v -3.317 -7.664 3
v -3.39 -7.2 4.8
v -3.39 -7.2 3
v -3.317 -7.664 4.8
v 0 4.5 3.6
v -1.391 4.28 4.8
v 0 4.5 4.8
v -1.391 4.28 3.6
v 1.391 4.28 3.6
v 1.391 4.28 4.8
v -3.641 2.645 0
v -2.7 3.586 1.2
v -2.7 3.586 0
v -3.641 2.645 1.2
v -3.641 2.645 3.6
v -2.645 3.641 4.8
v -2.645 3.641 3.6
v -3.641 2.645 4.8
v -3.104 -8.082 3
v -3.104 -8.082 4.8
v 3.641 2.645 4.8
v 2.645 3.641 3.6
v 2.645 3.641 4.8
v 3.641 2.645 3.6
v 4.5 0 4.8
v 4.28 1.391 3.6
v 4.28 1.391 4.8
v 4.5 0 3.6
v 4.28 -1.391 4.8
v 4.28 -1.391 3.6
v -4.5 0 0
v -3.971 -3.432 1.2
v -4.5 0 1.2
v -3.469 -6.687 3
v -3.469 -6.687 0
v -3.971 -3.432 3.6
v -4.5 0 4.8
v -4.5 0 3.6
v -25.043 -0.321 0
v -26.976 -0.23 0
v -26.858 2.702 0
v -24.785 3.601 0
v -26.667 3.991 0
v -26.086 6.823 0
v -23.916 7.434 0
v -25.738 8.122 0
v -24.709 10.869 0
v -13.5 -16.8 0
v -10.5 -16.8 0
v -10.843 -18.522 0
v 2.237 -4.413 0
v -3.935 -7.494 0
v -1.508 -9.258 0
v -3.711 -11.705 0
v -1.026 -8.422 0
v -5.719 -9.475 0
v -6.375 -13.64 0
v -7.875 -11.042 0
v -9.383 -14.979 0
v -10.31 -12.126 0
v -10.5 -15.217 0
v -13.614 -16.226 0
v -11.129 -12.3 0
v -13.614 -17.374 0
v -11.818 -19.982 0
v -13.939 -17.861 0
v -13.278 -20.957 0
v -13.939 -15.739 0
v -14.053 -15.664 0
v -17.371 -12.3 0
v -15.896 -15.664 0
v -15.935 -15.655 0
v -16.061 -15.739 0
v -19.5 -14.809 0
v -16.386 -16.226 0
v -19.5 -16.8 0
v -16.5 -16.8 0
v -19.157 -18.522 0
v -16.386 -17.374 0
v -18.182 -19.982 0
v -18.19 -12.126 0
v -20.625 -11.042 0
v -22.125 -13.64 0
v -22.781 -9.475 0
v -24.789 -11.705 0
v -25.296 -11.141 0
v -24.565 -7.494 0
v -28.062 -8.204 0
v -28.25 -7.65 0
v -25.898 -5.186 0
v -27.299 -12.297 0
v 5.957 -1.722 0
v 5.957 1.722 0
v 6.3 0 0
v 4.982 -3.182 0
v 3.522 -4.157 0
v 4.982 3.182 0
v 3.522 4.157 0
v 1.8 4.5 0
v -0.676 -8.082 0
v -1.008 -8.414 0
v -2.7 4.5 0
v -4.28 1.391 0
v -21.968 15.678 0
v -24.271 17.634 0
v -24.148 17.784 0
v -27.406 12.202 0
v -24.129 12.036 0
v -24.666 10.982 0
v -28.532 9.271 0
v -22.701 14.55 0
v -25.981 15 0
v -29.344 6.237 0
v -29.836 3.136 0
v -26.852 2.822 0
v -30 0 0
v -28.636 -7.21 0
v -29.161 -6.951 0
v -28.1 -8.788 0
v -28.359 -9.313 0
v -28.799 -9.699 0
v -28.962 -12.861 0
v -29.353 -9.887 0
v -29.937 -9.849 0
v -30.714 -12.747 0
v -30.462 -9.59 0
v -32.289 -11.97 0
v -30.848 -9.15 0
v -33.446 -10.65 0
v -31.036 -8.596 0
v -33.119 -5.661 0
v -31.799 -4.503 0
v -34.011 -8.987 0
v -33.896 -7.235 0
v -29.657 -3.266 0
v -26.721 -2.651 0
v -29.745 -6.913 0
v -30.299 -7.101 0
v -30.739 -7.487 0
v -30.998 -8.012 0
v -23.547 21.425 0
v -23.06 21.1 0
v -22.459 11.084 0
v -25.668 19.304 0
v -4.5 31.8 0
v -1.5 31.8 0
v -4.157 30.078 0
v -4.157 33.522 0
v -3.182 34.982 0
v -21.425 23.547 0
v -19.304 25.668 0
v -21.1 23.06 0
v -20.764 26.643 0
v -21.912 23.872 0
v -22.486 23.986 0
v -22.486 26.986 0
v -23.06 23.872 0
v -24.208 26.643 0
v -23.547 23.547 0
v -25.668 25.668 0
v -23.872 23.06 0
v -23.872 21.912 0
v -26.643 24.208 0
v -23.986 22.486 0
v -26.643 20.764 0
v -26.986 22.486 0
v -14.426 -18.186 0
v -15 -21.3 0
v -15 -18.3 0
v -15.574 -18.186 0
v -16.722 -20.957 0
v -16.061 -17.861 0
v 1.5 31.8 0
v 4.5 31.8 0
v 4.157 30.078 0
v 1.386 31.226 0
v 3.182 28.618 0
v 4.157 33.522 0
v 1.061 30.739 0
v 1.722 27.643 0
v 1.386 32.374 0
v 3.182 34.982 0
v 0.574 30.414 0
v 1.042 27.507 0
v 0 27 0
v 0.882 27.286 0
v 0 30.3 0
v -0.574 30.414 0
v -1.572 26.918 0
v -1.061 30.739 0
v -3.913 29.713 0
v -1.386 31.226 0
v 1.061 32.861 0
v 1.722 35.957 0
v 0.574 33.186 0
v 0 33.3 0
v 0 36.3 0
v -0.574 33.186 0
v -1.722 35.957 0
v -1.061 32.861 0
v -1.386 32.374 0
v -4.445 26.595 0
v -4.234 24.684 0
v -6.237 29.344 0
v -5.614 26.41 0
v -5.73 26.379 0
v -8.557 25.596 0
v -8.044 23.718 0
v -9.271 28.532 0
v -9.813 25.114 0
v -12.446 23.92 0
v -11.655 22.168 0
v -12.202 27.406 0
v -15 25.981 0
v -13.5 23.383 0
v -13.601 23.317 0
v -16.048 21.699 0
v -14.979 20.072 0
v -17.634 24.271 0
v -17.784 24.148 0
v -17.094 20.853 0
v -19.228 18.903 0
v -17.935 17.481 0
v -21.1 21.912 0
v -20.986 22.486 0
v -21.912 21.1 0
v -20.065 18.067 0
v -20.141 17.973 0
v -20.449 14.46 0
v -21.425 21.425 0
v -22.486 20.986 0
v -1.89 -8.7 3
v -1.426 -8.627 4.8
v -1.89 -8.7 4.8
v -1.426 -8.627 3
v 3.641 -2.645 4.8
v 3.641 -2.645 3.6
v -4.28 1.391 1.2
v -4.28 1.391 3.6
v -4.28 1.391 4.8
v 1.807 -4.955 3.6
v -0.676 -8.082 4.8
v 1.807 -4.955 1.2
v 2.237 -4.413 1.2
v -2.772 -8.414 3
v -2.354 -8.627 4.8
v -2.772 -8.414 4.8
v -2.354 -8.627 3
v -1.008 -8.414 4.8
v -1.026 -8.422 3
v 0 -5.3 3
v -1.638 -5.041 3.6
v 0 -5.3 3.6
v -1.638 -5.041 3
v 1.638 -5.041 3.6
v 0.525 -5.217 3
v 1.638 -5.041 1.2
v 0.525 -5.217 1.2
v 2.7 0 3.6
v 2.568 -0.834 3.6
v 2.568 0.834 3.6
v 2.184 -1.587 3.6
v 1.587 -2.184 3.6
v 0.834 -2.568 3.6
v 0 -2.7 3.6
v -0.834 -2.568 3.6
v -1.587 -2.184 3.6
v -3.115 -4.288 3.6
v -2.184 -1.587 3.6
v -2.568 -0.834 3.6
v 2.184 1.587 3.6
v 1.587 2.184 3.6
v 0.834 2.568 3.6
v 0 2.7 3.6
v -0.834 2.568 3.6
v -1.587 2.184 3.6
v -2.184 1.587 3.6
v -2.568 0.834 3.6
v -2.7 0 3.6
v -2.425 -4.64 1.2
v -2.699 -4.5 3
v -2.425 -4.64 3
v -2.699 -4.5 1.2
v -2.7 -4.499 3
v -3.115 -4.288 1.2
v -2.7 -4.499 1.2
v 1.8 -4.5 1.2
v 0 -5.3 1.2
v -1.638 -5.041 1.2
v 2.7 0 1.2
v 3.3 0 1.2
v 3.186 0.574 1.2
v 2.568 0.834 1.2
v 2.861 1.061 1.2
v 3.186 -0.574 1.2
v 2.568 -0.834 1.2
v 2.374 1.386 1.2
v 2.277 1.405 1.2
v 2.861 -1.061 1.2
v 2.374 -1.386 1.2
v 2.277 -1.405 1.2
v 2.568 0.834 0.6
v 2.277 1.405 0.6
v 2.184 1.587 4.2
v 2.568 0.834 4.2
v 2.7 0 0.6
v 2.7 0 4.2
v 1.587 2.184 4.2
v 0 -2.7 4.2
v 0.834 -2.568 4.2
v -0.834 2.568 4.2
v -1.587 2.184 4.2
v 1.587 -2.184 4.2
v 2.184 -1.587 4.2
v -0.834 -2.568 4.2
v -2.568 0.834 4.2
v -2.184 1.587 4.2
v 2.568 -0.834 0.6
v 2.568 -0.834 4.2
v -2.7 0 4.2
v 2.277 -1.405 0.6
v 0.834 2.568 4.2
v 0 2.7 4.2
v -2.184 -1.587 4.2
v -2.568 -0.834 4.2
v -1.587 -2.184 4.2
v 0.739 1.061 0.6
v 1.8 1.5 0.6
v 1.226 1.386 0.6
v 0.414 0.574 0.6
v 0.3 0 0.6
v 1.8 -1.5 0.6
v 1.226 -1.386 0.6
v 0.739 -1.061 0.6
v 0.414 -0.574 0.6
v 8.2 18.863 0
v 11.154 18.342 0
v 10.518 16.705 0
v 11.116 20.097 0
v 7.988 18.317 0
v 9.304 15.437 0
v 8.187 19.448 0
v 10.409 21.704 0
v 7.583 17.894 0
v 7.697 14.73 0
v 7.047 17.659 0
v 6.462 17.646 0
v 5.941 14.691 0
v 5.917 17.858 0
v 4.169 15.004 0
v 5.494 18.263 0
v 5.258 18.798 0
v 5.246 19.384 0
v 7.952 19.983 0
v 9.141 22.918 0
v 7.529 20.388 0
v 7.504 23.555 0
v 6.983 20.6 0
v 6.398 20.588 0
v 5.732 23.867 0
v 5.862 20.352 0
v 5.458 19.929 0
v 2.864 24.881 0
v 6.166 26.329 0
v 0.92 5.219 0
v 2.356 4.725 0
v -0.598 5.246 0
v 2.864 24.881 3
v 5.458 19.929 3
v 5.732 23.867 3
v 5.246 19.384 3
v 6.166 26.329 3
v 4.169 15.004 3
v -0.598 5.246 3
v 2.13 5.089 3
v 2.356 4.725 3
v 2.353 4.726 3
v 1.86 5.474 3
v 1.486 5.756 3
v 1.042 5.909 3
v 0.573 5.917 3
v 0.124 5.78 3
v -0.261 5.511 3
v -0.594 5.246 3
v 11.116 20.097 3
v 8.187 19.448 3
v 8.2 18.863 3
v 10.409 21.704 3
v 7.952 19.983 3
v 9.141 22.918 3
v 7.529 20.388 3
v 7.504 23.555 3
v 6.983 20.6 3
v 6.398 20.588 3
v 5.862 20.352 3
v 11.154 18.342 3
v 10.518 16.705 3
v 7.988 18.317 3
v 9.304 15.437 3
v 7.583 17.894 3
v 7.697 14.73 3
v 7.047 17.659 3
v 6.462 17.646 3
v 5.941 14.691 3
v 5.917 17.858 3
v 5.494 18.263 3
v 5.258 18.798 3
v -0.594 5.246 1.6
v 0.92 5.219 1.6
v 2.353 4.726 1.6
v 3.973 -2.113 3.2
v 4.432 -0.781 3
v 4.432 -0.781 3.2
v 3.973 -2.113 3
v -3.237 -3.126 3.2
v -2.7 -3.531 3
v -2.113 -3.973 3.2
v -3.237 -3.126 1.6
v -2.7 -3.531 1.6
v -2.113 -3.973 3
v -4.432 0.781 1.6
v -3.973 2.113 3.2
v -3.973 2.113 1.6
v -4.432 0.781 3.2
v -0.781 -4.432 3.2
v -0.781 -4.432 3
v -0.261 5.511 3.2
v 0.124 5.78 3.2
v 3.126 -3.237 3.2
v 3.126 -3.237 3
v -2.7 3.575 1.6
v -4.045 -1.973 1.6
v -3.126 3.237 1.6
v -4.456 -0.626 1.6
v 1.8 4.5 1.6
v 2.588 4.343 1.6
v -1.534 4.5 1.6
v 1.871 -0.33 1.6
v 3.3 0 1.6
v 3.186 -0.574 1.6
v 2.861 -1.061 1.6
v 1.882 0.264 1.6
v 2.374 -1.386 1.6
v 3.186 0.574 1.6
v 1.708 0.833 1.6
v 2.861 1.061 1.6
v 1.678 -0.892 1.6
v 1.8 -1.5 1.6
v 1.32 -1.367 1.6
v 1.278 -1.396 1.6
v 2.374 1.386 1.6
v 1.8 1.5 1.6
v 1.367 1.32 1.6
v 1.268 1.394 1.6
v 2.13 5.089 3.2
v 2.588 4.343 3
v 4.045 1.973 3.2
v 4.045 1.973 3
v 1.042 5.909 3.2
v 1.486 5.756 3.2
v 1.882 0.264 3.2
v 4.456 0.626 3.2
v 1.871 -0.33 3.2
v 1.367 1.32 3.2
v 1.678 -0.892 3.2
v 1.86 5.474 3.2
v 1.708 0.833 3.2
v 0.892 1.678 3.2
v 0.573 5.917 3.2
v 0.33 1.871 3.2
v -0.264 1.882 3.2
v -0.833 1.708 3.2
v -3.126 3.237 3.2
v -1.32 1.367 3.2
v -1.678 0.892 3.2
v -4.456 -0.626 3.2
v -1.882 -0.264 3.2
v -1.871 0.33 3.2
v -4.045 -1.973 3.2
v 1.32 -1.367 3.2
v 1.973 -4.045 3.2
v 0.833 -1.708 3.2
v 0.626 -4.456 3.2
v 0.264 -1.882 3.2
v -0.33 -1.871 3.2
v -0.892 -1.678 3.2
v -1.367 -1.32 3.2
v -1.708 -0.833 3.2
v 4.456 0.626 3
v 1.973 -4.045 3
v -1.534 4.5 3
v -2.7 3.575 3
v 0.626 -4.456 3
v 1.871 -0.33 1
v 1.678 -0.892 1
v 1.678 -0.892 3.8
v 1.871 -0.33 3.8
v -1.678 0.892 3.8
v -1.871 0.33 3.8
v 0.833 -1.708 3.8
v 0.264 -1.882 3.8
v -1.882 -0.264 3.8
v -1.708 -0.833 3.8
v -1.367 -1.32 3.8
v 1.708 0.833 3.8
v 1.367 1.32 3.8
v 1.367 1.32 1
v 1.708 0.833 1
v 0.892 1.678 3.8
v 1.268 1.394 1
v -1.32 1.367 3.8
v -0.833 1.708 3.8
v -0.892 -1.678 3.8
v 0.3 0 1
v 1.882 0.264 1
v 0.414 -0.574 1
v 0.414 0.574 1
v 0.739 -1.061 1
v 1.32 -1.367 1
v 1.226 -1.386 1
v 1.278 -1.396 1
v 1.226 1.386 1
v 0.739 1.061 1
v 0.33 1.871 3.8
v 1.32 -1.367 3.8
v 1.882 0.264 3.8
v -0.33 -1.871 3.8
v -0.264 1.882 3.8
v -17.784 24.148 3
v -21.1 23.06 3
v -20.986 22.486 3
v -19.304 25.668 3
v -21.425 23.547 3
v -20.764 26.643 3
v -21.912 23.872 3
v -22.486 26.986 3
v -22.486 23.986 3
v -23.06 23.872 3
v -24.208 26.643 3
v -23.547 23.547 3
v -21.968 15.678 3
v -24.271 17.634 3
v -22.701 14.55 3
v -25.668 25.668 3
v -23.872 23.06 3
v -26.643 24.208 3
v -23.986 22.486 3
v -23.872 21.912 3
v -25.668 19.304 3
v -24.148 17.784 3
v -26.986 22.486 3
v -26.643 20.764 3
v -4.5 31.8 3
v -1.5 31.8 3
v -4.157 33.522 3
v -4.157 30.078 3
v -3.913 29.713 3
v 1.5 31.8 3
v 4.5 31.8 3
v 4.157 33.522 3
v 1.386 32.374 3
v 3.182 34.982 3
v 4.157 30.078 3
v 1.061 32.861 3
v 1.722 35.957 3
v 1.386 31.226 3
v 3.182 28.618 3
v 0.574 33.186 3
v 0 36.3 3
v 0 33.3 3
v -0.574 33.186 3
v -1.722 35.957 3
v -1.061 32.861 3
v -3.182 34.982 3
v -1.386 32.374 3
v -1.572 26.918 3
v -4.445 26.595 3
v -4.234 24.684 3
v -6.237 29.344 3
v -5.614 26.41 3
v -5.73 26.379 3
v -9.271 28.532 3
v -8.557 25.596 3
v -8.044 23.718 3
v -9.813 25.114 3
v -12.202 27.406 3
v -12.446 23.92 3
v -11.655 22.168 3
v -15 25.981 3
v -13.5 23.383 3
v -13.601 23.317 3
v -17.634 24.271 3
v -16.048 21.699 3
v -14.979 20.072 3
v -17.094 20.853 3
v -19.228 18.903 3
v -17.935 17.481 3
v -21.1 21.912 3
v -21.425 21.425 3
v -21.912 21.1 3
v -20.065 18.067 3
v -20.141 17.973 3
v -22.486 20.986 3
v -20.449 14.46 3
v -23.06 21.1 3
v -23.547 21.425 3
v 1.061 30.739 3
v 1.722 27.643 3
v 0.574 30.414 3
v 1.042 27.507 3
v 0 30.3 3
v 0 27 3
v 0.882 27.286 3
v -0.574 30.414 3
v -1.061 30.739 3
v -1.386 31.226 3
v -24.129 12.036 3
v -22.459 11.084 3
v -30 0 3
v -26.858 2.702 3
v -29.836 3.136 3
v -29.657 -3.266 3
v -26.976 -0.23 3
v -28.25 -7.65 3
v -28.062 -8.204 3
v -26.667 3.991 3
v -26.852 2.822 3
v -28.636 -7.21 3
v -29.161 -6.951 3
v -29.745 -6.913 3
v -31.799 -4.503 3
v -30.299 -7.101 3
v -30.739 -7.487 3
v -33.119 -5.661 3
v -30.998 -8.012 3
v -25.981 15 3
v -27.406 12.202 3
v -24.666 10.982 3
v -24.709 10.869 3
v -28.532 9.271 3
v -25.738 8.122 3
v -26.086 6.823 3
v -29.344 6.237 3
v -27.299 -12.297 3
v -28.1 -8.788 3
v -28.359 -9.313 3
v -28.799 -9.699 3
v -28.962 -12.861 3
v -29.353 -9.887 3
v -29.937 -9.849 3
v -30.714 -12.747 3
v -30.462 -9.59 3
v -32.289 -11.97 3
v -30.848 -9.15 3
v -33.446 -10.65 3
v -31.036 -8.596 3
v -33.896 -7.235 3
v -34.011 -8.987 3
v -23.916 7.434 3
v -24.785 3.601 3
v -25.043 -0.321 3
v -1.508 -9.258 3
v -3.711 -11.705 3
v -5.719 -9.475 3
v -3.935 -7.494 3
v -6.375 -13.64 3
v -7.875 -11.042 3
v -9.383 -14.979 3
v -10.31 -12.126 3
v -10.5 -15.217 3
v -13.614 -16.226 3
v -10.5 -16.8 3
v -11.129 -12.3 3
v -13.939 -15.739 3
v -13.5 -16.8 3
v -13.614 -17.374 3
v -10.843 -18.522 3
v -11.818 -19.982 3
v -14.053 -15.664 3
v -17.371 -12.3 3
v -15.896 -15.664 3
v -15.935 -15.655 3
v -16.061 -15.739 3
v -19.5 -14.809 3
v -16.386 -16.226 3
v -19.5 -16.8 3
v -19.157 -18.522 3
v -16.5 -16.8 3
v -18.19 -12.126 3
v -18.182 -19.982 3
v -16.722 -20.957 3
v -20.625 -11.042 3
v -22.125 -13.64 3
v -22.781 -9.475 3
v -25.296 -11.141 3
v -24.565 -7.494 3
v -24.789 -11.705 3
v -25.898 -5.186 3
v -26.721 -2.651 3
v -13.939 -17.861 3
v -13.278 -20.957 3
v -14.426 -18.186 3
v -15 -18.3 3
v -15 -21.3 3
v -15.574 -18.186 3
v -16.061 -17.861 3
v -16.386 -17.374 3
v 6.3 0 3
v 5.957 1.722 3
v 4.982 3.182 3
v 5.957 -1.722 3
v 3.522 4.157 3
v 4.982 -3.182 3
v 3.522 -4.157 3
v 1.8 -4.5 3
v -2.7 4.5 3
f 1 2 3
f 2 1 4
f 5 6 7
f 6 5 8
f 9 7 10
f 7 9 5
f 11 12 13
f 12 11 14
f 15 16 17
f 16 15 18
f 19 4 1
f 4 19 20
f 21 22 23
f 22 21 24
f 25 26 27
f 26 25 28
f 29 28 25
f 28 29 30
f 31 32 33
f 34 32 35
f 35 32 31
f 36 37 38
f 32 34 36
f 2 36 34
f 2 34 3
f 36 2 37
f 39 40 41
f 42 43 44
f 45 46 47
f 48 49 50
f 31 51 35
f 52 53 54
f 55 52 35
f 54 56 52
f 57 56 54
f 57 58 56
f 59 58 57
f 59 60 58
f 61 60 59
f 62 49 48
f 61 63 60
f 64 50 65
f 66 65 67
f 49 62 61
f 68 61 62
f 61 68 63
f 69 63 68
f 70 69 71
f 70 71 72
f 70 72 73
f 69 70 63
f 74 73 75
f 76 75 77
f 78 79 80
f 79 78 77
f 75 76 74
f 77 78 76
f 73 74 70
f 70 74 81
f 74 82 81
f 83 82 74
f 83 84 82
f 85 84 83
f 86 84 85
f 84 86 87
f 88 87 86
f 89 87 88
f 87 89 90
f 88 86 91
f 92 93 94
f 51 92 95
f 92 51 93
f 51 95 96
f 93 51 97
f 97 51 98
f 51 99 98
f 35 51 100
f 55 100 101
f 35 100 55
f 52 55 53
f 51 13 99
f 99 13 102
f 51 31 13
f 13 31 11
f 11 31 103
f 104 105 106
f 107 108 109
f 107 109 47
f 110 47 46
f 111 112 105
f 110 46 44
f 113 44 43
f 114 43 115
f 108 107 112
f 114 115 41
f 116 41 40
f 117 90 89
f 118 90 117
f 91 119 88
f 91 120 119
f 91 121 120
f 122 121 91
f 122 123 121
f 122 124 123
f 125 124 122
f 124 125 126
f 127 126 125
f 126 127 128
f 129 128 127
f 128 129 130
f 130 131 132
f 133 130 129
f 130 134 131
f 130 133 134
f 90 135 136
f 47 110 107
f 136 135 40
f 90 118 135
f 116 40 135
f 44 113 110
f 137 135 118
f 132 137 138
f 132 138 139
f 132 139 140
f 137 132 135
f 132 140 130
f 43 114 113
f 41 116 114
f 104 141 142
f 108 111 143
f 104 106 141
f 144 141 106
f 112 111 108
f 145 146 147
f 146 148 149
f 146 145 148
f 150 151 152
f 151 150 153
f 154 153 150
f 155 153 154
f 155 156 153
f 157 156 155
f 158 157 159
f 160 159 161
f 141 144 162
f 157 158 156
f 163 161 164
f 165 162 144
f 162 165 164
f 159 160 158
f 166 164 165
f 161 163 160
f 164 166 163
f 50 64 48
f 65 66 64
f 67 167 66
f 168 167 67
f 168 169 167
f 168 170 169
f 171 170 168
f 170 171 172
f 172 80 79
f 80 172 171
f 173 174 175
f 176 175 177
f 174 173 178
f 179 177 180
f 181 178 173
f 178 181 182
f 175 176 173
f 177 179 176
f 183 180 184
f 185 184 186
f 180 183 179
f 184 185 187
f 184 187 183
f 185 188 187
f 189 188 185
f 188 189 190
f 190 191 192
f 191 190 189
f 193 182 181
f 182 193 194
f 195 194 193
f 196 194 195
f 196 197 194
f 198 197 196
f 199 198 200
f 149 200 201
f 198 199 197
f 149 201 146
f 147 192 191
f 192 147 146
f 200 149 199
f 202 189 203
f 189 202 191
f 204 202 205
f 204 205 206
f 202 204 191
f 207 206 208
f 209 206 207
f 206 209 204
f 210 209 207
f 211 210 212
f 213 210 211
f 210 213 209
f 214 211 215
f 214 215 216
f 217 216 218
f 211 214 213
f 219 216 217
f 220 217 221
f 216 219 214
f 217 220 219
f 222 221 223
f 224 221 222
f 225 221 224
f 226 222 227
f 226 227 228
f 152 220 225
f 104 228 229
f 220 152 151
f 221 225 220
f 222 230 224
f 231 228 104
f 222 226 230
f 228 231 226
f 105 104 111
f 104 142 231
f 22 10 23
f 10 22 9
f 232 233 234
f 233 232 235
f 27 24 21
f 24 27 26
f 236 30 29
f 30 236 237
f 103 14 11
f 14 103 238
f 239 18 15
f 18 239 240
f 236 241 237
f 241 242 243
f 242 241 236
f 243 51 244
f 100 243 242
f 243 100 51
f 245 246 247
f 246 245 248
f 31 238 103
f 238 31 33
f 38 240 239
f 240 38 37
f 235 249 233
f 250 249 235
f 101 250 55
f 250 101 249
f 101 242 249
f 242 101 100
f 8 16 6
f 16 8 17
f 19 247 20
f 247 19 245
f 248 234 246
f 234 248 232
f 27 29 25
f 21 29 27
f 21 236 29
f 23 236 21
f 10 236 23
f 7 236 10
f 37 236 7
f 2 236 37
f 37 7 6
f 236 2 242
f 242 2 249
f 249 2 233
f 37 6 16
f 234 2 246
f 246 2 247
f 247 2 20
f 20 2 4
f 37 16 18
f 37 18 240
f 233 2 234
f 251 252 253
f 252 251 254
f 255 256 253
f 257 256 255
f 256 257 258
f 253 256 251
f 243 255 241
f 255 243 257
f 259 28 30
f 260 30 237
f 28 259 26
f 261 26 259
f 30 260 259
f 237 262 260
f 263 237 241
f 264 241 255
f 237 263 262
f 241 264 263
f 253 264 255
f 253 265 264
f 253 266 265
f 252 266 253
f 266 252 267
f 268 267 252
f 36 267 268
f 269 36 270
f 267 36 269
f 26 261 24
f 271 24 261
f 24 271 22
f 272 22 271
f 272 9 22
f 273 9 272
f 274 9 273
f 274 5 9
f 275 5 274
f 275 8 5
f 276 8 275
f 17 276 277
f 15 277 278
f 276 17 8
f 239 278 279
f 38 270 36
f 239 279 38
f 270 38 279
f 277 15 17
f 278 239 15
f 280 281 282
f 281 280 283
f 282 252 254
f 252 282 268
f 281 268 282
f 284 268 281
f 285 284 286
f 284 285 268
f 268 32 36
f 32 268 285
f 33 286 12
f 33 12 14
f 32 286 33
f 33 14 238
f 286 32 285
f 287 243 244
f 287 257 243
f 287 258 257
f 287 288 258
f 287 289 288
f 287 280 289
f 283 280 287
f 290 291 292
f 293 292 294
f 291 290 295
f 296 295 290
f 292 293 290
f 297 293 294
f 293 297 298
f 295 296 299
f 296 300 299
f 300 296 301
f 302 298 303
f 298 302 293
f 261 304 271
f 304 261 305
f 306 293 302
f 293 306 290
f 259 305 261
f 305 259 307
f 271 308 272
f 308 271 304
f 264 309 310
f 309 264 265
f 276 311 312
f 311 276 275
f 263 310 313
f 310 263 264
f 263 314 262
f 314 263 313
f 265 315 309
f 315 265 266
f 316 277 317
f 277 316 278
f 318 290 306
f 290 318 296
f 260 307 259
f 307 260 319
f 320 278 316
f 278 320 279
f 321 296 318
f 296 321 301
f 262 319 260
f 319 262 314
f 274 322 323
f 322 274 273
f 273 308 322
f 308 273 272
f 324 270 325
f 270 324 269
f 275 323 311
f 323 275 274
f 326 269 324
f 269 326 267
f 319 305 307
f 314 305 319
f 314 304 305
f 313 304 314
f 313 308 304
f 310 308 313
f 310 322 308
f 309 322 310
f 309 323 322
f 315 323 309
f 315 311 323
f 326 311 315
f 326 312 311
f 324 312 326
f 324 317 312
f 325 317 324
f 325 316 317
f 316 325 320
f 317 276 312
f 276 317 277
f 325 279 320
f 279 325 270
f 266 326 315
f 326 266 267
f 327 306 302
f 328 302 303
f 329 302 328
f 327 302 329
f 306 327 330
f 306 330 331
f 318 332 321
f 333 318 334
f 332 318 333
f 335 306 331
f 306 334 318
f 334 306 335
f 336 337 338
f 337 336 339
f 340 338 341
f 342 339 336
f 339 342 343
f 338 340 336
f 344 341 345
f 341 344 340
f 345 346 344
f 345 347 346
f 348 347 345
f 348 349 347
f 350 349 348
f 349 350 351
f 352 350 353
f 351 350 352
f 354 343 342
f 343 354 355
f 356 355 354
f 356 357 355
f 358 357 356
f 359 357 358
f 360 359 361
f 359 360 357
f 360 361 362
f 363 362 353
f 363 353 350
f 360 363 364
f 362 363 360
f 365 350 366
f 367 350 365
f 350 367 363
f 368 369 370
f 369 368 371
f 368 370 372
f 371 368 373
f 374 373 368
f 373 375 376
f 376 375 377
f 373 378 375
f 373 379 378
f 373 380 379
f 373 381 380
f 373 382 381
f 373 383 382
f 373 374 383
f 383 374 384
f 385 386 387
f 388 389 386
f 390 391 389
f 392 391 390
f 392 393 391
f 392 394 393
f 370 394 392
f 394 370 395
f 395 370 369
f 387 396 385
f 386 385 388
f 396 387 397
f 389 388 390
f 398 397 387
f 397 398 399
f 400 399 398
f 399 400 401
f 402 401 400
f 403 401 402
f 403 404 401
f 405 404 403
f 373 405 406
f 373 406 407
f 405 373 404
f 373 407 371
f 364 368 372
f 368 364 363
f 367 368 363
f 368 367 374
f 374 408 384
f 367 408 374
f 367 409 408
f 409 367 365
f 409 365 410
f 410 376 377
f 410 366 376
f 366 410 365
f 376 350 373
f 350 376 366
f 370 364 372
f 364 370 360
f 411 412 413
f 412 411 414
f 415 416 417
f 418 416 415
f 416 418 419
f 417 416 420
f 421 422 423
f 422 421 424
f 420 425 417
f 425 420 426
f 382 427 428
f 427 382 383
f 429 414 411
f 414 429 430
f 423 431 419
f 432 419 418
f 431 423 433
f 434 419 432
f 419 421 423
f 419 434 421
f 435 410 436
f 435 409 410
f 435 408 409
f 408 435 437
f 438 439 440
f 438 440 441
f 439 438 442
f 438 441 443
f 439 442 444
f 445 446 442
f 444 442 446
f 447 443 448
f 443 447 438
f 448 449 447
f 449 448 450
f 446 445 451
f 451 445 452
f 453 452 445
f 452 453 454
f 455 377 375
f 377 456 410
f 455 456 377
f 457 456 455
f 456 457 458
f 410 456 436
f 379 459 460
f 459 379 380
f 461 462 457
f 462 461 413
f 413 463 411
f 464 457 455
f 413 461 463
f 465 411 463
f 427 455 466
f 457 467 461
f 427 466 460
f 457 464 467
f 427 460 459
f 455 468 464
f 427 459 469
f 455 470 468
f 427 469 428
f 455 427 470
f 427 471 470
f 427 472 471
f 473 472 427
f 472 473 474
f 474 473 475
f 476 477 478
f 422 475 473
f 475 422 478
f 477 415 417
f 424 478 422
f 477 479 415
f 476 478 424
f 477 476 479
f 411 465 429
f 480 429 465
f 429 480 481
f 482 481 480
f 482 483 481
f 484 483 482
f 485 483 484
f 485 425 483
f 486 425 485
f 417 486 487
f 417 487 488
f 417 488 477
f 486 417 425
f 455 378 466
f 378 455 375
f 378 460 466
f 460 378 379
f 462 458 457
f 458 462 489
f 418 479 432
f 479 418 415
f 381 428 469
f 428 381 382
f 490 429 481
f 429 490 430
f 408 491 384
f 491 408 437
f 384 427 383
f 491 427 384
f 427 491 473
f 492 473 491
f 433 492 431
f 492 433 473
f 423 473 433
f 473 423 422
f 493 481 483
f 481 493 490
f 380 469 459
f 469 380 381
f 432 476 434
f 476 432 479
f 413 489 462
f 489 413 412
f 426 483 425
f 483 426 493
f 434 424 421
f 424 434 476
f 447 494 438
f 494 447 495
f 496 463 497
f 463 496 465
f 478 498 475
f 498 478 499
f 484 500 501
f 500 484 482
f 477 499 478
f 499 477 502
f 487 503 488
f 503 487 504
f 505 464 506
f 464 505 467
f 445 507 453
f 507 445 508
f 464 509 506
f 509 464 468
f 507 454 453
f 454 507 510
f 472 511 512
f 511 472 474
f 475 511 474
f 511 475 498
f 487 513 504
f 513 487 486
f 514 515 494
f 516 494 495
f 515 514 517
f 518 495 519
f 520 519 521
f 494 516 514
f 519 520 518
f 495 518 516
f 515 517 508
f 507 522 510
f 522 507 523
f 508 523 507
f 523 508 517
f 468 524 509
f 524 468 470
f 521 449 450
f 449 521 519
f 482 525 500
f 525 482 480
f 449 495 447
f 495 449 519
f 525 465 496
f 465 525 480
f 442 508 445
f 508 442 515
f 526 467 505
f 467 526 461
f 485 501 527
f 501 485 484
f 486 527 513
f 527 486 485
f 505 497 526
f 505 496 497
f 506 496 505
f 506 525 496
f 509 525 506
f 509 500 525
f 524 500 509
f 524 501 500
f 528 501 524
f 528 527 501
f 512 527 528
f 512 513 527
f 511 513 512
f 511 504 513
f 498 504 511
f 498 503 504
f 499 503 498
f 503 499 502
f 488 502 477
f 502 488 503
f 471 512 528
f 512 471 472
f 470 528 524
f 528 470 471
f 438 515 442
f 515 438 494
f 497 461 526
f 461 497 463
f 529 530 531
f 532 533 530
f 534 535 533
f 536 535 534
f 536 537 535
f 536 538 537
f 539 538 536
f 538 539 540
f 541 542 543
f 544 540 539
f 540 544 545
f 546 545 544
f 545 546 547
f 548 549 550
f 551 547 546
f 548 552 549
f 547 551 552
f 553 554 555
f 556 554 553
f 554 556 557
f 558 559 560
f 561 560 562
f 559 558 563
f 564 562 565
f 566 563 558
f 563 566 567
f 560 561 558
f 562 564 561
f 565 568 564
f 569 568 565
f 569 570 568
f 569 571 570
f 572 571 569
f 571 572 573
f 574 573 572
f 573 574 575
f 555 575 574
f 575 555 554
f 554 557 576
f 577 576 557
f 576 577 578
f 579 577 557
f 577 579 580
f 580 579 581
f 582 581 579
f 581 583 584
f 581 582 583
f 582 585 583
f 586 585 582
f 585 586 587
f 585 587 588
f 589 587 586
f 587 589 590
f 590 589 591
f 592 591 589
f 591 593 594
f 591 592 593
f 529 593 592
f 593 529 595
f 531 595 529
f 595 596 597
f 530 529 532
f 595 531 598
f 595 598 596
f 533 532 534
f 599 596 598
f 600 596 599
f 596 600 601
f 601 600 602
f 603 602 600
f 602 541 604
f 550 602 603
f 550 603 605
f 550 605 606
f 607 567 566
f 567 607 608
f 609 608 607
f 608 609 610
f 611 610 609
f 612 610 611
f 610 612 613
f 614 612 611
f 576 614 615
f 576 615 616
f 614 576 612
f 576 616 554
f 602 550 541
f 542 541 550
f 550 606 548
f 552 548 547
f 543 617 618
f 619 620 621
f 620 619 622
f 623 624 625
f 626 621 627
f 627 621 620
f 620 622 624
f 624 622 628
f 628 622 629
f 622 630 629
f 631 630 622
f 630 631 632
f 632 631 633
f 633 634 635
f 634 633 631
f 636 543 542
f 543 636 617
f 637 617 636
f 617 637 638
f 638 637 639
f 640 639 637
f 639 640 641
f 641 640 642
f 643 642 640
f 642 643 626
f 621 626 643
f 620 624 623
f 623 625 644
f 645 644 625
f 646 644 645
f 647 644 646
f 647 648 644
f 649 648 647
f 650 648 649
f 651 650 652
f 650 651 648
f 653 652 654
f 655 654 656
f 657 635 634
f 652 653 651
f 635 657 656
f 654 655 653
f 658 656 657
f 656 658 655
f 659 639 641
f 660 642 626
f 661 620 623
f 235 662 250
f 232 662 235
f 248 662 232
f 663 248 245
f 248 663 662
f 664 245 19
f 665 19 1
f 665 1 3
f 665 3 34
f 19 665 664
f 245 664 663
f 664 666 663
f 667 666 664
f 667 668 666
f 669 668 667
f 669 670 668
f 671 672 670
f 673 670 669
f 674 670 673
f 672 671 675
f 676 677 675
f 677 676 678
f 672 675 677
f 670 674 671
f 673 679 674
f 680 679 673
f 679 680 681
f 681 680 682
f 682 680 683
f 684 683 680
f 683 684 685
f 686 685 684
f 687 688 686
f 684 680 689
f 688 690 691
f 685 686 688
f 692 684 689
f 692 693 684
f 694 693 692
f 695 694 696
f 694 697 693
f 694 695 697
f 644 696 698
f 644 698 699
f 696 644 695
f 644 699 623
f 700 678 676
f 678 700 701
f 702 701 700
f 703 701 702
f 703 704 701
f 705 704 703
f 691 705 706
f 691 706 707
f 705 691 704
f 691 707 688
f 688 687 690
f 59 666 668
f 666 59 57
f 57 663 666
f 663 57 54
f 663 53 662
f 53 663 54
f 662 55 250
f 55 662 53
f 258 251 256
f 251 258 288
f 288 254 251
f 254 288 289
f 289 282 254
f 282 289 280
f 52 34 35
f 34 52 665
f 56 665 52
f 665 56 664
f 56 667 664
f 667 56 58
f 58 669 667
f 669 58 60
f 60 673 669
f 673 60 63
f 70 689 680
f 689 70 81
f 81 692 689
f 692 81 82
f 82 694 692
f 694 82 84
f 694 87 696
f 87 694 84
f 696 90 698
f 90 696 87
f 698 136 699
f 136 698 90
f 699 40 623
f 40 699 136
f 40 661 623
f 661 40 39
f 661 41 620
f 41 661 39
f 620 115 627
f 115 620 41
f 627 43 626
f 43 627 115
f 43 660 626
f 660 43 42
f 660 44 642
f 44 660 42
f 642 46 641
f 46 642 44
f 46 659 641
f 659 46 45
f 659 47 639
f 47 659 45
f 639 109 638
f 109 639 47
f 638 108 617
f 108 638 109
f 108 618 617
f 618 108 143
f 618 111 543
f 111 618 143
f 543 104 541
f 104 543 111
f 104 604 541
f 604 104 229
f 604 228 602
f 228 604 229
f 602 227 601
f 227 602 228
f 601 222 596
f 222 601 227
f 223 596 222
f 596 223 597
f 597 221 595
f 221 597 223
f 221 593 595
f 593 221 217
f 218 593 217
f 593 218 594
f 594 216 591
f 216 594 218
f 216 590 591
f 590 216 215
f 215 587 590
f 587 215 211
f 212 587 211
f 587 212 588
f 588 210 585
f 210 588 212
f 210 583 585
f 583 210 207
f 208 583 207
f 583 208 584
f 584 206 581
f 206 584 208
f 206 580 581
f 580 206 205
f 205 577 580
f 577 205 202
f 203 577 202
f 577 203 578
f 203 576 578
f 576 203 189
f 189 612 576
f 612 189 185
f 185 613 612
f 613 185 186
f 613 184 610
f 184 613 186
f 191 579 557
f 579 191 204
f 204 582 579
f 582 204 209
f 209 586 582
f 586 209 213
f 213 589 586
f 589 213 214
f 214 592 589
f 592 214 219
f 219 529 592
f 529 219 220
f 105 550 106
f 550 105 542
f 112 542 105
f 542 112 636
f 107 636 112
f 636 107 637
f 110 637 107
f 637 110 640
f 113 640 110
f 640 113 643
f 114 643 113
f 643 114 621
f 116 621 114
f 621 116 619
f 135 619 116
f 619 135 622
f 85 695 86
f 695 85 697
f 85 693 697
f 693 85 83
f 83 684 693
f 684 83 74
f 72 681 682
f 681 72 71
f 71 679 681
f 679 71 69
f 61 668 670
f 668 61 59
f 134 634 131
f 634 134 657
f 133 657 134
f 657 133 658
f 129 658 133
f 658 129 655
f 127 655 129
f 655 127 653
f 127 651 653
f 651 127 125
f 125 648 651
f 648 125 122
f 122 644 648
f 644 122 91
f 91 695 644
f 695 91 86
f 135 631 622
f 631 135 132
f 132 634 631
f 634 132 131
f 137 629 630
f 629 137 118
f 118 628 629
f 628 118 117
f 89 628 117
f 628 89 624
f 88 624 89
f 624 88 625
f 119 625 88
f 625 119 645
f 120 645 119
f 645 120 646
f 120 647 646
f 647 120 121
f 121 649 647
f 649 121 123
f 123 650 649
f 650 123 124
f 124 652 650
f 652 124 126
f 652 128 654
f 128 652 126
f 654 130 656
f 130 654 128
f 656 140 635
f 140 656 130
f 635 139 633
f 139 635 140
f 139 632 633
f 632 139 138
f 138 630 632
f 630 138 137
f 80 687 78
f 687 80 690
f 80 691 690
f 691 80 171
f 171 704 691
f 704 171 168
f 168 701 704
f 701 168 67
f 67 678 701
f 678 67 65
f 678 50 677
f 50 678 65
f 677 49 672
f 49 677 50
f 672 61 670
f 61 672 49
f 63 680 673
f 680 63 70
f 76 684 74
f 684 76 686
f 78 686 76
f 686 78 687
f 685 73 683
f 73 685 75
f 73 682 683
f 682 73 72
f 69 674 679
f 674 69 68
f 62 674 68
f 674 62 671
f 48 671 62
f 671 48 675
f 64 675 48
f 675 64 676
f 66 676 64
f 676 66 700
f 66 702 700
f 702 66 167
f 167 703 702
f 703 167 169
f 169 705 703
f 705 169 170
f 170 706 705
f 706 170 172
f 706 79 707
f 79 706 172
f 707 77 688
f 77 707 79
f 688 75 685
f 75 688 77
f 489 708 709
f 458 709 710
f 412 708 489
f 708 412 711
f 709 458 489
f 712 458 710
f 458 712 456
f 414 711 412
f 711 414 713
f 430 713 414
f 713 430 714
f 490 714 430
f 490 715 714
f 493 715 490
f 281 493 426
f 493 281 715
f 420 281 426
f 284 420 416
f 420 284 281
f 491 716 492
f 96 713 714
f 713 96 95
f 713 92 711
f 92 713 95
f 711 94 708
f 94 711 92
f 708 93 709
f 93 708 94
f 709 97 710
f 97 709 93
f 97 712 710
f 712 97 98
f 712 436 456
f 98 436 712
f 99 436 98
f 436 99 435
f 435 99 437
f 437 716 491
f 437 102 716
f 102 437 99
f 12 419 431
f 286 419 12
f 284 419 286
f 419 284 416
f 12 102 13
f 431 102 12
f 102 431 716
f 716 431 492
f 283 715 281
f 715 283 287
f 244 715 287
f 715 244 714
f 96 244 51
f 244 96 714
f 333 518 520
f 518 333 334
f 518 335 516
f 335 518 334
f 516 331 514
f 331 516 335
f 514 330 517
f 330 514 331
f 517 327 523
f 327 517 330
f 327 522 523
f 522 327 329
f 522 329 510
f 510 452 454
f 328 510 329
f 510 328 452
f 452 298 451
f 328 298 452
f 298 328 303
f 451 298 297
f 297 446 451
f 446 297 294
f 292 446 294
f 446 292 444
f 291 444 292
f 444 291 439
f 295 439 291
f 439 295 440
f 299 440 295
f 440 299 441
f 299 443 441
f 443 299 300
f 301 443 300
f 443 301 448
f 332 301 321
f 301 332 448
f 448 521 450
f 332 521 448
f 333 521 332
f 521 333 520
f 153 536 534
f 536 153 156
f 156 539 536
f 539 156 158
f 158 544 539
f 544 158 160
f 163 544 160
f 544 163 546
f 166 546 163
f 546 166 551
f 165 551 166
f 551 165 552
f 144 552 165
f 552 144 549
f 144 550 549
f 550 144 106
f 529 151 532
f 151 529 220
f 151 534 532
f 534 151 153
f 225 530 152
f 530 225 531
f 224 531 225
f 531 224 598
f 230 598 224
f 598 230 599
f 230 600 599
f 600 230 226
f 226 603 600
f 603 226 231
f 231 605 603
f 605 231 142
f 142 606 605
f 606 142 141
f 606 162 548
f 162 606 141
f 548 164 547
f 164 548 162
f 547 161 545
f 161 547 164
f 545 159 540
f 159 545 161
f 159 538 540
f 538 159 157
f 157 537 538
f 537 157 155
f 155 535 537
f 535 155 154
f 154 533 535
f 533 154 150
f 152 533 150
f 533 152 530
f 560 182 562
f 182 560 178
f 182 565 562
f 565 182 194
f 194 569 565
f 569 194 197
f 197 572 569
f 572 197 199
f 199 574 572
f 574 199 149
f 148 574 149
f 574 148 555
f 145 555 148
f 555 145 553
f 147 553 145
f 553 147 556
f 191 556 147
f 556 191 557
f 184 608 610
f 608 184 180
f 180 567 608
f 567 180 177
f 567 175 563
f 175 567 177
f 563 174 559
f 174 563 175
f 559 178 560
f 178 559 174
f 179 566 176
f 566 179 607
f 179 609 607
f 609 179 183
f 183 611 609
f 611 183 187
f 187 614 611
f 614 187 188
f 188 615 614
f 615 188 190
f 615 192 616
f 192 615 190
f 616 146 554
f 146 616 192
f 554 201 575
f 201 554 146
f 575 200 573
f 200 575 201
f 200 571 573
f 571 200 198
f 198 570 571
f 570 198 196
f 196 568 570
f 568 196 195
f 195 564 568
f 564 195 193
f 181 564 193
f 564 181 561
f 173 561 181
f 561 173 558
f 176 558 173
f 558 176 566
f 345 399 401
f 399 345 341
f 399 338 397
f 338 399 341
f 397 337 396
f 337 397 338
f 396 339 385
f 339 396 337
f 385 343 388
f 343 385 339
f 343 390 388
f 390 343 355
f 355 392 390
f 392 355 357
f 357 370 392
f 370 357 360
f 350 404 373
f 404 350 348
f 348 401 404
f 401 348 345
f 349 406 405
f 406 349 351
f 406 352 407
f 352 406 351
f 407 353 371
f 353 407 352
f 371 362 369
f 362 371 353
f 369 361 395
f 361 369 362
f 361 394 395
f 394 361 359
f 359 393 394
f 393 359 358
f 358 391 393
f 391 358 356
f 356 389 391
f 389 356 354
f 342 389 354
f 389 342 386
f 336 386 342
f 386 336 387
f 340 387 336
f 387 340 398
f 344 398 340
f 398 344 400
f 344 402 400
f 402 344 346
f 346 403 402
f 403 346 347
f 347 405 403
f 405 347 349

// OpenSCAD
// file: ratchetClip.scad
/*
    A clip with a ratchet mechanism.

    Inspired by : https://www.youmagine.com/designs/ratchets
    But this version doesn't need the nut and bolt.
    
    
    
    Print Notes
    
        "gap" should be set to twice your layer height
    
        If the printed piece doesn't move, first make sure that the print bed has been leveled correctly,
        then try increasing the "slack" and/or "gap" parameters. Increase gap if the layers are sticking to
        each other. Increase slack if the two pieces are merging into one another. Another option is to use
        inPlace=false, and print with supports.    
    
*/

DEFAULT_THICKNESS=3;
DEFAULT_HEFT=3;

/*
    size       The radius of the large quarter circle, the diameter of the small semi circle
    thickness  The thickness in the Z-axis
    heft       The thickness in the X/Y axis
    notches    The number of notches
    quality    How smooth the curves are
    play       How much shorter the arm is. Use a -ve number  if you want the arm longer
    slack      The gap in the X/Y axis to allow the two pieces to move freely.
               Will depend on the precesion of your printer
    gap        The gap in the Z axis to allow the two pieces to move freely.
               Set this to the layer height of the final print?
    inPlace    Print the two pieces in their final positions.
               If you cannot move the printed object, try inPlace=false, and print with supports.
*/
module ratchetClip( size=30, thickness=DEFAULT_THICKNESS, bulgeThickness=undef, heft=DEFAULT_HEFT, notches=undef, quality=60, tooth=2, play=0, slack=0.8, gap=0.4, bulge=undef, inPlace=true )
{
    big = bulge ? bulge : heft*3;
    notchCount=notches ? notches : size/3;
    bulgeHeight = bulgeThickness ? bulgeThickness : thickness*1.6;

    small = big*0.6;
    round = 20;
    axisHeight = bulgeHeight-gap*5;

    module shape()
    { 
        // Small semi circle
        #translate([-size/2+heft/4,0]) difference() {
            circle( d=size+heft/2, $fn=quality/2 );
            circle( d=size-heft*1.5, $fn=quality/2 );
            translate( [-size,0] ) square([size*2,size*2]);
            // arm will fit in here
            translate( [size/2-heft/4,0] ) circle( d=big+slack*2, $fn=round );
        }

        // Large quarter circle
        difference() {
            circle( d=size*2, $fn=quality );
            circle( d=size*2-heft*2, $fn=quality );
            square([size*4,size*4]);
            translate( [-size*2,-size*4] ) square([size*4,size*4]);
        }
        
        // Rounded end
        translate( [0,size-heft/2] ) rotate(90) circle( d=heft, $fn=10 );
    }
    
    module armShape()
    {
        difference() {
            hull() {
                translate([0,-play]) endShape();
                circle( d=heft, $fn=round );
            }
            circle( d=big+slack*2, $fn=round );
        }
    }
    
    module endShape()
    {
        hull() {
            translate( [0,size-heft] ) {
                polygon( [[heft/2,-tooth],[heft/2,0],[-heft/2,-tooth]] );
            }
        }
    }
    
    module notchShape()
    {
        hull() {
            translate( [0,size-heft] ) {
                polygon( [[heft/2,0],[-heft/2,0],[-heft/2,-tooth]] );
            }
        }
    }
    
    module arm()
    {
        // The long piece of the arm
        linear_extrude( thickness ) {
            armShape();
        }
        
        // The middle of the sandwich, which fits into the main ratchet piece.
        translate([ 0,0, bulgeHeight/3 ]) {
            linear_extrude( bulgeHeight/3 ) {
                hull() {
                    circle( d=big, $fn=round );
                    translate( [0,big*0.5] ) circle( d=heft, $fn=round );
                }
            }
        }

        // Axis for the arm
        translate([ 0,0,( bulgeHeight-axisHeight) /2 ]) {
            linear_extrude( axisHeight ) {
                circle( d=small-slack*2, $fn=round );
            }
        }
    }

    // The main piece
    linear_extrude( thickness, convexity=6 ) {
        shape();
        // Notches
        for ( i = [1:notchCount] ) {
            rotate( 90 * (i-0.3)/notchCount) notchShape();
        }
    }
    
    
    // The extra bulky part of the main piece into which the arm will fit.
    difference() {
    
        linear_extrude( bulgeHeight, convexity=4 ) {
            hull() {
                circle( d=big, $fn=round );
                translate([-big*0.21, -big*0.8]) circle( d=heft, $fn=round );
            }
        }
        
        // Remove the middle third of the sandwich
        translate( [0,0,bulgeHeight/3-gap] ) {
            linear_extrude( bulgeHeight/3 + gap*2 ) {
                circle( d=big+slack*2, $fn=round );
            }
        }
        
        // Remove the space for the arm's axis
        translate( [0,0,(bulgeHeight-axisHeight-gap*2)/2] ) {
            cylinder( d=small, h=axisHeight+gap*2, $fn=round );
        }

    }

    armPosition( inPlace, heft ) arm();
    
    // To aid development
    //%translate( [10,0,0] ) arm();
    //%rotate( [0,0,42] ) arm();
}

module armPosition( inPlace, heft=3 )
{
    if (inPlace) {
        rotate( [0,0,-10] ) children();
    } else {
        translate( [heft*4, 0,0] ) children();
    }
}

module armHolePosition( size, inPlace=true, offset=10, heft=DEFAULT_HEFT )
{
    armPosition( inPlace ) translate( [heft/2,size-offset,0] ) children();
}

module holePosition( size, angle, heft=DEFAULT_HEFT )
{
    if (angle>180) {
        translate( [-size/2,0,0] ) rotate( [0,0,angle] ) translate( [size/2,0,0] ) children();
    } else {
        rotate( [0,0,angle] ) translate( [size,0,0] ) children();
    }
}

module hole( d=3, heft=DEFAULT_HEFT, thickness=DEFAULT_THICKNESS, flat=true, $fn=16 )
{
    big=d+heft*2;
    
 
    translate( [heft*0.6,0,0] ) linear_extrude( thickness ) {
        difference() {
            union() {
                if (flat) {
                    translate([-big/2,-big/2]) square( [big/2, big] );
                }
                circle( d=big );
            }
            circle( d=d );
        }
    }
}

module inspect(angle=0)
{
    intersection() {
        children();
        rotate([0,0,angle]) translate([-0.5,-50,0]) cube( [1,100,100] );
    }
}
// main file
use <ratchetClip.scad>;

size = 30;
inPlace=true;

ratchetClip( size=size, inPlace=inPlace );

// Example attachment holes

#holePosition( size=size, angle=210 ) hole();
#holePosition( size=size, angle=270 ) hole();
#holePosition( size=size, angle=360 ) hole();

holePosition( size=size, angle=135 ) hole();
holePosition( size=size, angle=90 ) hole( flat=false );

armHolePosition( size, inPlace=inPlace ) hole();
